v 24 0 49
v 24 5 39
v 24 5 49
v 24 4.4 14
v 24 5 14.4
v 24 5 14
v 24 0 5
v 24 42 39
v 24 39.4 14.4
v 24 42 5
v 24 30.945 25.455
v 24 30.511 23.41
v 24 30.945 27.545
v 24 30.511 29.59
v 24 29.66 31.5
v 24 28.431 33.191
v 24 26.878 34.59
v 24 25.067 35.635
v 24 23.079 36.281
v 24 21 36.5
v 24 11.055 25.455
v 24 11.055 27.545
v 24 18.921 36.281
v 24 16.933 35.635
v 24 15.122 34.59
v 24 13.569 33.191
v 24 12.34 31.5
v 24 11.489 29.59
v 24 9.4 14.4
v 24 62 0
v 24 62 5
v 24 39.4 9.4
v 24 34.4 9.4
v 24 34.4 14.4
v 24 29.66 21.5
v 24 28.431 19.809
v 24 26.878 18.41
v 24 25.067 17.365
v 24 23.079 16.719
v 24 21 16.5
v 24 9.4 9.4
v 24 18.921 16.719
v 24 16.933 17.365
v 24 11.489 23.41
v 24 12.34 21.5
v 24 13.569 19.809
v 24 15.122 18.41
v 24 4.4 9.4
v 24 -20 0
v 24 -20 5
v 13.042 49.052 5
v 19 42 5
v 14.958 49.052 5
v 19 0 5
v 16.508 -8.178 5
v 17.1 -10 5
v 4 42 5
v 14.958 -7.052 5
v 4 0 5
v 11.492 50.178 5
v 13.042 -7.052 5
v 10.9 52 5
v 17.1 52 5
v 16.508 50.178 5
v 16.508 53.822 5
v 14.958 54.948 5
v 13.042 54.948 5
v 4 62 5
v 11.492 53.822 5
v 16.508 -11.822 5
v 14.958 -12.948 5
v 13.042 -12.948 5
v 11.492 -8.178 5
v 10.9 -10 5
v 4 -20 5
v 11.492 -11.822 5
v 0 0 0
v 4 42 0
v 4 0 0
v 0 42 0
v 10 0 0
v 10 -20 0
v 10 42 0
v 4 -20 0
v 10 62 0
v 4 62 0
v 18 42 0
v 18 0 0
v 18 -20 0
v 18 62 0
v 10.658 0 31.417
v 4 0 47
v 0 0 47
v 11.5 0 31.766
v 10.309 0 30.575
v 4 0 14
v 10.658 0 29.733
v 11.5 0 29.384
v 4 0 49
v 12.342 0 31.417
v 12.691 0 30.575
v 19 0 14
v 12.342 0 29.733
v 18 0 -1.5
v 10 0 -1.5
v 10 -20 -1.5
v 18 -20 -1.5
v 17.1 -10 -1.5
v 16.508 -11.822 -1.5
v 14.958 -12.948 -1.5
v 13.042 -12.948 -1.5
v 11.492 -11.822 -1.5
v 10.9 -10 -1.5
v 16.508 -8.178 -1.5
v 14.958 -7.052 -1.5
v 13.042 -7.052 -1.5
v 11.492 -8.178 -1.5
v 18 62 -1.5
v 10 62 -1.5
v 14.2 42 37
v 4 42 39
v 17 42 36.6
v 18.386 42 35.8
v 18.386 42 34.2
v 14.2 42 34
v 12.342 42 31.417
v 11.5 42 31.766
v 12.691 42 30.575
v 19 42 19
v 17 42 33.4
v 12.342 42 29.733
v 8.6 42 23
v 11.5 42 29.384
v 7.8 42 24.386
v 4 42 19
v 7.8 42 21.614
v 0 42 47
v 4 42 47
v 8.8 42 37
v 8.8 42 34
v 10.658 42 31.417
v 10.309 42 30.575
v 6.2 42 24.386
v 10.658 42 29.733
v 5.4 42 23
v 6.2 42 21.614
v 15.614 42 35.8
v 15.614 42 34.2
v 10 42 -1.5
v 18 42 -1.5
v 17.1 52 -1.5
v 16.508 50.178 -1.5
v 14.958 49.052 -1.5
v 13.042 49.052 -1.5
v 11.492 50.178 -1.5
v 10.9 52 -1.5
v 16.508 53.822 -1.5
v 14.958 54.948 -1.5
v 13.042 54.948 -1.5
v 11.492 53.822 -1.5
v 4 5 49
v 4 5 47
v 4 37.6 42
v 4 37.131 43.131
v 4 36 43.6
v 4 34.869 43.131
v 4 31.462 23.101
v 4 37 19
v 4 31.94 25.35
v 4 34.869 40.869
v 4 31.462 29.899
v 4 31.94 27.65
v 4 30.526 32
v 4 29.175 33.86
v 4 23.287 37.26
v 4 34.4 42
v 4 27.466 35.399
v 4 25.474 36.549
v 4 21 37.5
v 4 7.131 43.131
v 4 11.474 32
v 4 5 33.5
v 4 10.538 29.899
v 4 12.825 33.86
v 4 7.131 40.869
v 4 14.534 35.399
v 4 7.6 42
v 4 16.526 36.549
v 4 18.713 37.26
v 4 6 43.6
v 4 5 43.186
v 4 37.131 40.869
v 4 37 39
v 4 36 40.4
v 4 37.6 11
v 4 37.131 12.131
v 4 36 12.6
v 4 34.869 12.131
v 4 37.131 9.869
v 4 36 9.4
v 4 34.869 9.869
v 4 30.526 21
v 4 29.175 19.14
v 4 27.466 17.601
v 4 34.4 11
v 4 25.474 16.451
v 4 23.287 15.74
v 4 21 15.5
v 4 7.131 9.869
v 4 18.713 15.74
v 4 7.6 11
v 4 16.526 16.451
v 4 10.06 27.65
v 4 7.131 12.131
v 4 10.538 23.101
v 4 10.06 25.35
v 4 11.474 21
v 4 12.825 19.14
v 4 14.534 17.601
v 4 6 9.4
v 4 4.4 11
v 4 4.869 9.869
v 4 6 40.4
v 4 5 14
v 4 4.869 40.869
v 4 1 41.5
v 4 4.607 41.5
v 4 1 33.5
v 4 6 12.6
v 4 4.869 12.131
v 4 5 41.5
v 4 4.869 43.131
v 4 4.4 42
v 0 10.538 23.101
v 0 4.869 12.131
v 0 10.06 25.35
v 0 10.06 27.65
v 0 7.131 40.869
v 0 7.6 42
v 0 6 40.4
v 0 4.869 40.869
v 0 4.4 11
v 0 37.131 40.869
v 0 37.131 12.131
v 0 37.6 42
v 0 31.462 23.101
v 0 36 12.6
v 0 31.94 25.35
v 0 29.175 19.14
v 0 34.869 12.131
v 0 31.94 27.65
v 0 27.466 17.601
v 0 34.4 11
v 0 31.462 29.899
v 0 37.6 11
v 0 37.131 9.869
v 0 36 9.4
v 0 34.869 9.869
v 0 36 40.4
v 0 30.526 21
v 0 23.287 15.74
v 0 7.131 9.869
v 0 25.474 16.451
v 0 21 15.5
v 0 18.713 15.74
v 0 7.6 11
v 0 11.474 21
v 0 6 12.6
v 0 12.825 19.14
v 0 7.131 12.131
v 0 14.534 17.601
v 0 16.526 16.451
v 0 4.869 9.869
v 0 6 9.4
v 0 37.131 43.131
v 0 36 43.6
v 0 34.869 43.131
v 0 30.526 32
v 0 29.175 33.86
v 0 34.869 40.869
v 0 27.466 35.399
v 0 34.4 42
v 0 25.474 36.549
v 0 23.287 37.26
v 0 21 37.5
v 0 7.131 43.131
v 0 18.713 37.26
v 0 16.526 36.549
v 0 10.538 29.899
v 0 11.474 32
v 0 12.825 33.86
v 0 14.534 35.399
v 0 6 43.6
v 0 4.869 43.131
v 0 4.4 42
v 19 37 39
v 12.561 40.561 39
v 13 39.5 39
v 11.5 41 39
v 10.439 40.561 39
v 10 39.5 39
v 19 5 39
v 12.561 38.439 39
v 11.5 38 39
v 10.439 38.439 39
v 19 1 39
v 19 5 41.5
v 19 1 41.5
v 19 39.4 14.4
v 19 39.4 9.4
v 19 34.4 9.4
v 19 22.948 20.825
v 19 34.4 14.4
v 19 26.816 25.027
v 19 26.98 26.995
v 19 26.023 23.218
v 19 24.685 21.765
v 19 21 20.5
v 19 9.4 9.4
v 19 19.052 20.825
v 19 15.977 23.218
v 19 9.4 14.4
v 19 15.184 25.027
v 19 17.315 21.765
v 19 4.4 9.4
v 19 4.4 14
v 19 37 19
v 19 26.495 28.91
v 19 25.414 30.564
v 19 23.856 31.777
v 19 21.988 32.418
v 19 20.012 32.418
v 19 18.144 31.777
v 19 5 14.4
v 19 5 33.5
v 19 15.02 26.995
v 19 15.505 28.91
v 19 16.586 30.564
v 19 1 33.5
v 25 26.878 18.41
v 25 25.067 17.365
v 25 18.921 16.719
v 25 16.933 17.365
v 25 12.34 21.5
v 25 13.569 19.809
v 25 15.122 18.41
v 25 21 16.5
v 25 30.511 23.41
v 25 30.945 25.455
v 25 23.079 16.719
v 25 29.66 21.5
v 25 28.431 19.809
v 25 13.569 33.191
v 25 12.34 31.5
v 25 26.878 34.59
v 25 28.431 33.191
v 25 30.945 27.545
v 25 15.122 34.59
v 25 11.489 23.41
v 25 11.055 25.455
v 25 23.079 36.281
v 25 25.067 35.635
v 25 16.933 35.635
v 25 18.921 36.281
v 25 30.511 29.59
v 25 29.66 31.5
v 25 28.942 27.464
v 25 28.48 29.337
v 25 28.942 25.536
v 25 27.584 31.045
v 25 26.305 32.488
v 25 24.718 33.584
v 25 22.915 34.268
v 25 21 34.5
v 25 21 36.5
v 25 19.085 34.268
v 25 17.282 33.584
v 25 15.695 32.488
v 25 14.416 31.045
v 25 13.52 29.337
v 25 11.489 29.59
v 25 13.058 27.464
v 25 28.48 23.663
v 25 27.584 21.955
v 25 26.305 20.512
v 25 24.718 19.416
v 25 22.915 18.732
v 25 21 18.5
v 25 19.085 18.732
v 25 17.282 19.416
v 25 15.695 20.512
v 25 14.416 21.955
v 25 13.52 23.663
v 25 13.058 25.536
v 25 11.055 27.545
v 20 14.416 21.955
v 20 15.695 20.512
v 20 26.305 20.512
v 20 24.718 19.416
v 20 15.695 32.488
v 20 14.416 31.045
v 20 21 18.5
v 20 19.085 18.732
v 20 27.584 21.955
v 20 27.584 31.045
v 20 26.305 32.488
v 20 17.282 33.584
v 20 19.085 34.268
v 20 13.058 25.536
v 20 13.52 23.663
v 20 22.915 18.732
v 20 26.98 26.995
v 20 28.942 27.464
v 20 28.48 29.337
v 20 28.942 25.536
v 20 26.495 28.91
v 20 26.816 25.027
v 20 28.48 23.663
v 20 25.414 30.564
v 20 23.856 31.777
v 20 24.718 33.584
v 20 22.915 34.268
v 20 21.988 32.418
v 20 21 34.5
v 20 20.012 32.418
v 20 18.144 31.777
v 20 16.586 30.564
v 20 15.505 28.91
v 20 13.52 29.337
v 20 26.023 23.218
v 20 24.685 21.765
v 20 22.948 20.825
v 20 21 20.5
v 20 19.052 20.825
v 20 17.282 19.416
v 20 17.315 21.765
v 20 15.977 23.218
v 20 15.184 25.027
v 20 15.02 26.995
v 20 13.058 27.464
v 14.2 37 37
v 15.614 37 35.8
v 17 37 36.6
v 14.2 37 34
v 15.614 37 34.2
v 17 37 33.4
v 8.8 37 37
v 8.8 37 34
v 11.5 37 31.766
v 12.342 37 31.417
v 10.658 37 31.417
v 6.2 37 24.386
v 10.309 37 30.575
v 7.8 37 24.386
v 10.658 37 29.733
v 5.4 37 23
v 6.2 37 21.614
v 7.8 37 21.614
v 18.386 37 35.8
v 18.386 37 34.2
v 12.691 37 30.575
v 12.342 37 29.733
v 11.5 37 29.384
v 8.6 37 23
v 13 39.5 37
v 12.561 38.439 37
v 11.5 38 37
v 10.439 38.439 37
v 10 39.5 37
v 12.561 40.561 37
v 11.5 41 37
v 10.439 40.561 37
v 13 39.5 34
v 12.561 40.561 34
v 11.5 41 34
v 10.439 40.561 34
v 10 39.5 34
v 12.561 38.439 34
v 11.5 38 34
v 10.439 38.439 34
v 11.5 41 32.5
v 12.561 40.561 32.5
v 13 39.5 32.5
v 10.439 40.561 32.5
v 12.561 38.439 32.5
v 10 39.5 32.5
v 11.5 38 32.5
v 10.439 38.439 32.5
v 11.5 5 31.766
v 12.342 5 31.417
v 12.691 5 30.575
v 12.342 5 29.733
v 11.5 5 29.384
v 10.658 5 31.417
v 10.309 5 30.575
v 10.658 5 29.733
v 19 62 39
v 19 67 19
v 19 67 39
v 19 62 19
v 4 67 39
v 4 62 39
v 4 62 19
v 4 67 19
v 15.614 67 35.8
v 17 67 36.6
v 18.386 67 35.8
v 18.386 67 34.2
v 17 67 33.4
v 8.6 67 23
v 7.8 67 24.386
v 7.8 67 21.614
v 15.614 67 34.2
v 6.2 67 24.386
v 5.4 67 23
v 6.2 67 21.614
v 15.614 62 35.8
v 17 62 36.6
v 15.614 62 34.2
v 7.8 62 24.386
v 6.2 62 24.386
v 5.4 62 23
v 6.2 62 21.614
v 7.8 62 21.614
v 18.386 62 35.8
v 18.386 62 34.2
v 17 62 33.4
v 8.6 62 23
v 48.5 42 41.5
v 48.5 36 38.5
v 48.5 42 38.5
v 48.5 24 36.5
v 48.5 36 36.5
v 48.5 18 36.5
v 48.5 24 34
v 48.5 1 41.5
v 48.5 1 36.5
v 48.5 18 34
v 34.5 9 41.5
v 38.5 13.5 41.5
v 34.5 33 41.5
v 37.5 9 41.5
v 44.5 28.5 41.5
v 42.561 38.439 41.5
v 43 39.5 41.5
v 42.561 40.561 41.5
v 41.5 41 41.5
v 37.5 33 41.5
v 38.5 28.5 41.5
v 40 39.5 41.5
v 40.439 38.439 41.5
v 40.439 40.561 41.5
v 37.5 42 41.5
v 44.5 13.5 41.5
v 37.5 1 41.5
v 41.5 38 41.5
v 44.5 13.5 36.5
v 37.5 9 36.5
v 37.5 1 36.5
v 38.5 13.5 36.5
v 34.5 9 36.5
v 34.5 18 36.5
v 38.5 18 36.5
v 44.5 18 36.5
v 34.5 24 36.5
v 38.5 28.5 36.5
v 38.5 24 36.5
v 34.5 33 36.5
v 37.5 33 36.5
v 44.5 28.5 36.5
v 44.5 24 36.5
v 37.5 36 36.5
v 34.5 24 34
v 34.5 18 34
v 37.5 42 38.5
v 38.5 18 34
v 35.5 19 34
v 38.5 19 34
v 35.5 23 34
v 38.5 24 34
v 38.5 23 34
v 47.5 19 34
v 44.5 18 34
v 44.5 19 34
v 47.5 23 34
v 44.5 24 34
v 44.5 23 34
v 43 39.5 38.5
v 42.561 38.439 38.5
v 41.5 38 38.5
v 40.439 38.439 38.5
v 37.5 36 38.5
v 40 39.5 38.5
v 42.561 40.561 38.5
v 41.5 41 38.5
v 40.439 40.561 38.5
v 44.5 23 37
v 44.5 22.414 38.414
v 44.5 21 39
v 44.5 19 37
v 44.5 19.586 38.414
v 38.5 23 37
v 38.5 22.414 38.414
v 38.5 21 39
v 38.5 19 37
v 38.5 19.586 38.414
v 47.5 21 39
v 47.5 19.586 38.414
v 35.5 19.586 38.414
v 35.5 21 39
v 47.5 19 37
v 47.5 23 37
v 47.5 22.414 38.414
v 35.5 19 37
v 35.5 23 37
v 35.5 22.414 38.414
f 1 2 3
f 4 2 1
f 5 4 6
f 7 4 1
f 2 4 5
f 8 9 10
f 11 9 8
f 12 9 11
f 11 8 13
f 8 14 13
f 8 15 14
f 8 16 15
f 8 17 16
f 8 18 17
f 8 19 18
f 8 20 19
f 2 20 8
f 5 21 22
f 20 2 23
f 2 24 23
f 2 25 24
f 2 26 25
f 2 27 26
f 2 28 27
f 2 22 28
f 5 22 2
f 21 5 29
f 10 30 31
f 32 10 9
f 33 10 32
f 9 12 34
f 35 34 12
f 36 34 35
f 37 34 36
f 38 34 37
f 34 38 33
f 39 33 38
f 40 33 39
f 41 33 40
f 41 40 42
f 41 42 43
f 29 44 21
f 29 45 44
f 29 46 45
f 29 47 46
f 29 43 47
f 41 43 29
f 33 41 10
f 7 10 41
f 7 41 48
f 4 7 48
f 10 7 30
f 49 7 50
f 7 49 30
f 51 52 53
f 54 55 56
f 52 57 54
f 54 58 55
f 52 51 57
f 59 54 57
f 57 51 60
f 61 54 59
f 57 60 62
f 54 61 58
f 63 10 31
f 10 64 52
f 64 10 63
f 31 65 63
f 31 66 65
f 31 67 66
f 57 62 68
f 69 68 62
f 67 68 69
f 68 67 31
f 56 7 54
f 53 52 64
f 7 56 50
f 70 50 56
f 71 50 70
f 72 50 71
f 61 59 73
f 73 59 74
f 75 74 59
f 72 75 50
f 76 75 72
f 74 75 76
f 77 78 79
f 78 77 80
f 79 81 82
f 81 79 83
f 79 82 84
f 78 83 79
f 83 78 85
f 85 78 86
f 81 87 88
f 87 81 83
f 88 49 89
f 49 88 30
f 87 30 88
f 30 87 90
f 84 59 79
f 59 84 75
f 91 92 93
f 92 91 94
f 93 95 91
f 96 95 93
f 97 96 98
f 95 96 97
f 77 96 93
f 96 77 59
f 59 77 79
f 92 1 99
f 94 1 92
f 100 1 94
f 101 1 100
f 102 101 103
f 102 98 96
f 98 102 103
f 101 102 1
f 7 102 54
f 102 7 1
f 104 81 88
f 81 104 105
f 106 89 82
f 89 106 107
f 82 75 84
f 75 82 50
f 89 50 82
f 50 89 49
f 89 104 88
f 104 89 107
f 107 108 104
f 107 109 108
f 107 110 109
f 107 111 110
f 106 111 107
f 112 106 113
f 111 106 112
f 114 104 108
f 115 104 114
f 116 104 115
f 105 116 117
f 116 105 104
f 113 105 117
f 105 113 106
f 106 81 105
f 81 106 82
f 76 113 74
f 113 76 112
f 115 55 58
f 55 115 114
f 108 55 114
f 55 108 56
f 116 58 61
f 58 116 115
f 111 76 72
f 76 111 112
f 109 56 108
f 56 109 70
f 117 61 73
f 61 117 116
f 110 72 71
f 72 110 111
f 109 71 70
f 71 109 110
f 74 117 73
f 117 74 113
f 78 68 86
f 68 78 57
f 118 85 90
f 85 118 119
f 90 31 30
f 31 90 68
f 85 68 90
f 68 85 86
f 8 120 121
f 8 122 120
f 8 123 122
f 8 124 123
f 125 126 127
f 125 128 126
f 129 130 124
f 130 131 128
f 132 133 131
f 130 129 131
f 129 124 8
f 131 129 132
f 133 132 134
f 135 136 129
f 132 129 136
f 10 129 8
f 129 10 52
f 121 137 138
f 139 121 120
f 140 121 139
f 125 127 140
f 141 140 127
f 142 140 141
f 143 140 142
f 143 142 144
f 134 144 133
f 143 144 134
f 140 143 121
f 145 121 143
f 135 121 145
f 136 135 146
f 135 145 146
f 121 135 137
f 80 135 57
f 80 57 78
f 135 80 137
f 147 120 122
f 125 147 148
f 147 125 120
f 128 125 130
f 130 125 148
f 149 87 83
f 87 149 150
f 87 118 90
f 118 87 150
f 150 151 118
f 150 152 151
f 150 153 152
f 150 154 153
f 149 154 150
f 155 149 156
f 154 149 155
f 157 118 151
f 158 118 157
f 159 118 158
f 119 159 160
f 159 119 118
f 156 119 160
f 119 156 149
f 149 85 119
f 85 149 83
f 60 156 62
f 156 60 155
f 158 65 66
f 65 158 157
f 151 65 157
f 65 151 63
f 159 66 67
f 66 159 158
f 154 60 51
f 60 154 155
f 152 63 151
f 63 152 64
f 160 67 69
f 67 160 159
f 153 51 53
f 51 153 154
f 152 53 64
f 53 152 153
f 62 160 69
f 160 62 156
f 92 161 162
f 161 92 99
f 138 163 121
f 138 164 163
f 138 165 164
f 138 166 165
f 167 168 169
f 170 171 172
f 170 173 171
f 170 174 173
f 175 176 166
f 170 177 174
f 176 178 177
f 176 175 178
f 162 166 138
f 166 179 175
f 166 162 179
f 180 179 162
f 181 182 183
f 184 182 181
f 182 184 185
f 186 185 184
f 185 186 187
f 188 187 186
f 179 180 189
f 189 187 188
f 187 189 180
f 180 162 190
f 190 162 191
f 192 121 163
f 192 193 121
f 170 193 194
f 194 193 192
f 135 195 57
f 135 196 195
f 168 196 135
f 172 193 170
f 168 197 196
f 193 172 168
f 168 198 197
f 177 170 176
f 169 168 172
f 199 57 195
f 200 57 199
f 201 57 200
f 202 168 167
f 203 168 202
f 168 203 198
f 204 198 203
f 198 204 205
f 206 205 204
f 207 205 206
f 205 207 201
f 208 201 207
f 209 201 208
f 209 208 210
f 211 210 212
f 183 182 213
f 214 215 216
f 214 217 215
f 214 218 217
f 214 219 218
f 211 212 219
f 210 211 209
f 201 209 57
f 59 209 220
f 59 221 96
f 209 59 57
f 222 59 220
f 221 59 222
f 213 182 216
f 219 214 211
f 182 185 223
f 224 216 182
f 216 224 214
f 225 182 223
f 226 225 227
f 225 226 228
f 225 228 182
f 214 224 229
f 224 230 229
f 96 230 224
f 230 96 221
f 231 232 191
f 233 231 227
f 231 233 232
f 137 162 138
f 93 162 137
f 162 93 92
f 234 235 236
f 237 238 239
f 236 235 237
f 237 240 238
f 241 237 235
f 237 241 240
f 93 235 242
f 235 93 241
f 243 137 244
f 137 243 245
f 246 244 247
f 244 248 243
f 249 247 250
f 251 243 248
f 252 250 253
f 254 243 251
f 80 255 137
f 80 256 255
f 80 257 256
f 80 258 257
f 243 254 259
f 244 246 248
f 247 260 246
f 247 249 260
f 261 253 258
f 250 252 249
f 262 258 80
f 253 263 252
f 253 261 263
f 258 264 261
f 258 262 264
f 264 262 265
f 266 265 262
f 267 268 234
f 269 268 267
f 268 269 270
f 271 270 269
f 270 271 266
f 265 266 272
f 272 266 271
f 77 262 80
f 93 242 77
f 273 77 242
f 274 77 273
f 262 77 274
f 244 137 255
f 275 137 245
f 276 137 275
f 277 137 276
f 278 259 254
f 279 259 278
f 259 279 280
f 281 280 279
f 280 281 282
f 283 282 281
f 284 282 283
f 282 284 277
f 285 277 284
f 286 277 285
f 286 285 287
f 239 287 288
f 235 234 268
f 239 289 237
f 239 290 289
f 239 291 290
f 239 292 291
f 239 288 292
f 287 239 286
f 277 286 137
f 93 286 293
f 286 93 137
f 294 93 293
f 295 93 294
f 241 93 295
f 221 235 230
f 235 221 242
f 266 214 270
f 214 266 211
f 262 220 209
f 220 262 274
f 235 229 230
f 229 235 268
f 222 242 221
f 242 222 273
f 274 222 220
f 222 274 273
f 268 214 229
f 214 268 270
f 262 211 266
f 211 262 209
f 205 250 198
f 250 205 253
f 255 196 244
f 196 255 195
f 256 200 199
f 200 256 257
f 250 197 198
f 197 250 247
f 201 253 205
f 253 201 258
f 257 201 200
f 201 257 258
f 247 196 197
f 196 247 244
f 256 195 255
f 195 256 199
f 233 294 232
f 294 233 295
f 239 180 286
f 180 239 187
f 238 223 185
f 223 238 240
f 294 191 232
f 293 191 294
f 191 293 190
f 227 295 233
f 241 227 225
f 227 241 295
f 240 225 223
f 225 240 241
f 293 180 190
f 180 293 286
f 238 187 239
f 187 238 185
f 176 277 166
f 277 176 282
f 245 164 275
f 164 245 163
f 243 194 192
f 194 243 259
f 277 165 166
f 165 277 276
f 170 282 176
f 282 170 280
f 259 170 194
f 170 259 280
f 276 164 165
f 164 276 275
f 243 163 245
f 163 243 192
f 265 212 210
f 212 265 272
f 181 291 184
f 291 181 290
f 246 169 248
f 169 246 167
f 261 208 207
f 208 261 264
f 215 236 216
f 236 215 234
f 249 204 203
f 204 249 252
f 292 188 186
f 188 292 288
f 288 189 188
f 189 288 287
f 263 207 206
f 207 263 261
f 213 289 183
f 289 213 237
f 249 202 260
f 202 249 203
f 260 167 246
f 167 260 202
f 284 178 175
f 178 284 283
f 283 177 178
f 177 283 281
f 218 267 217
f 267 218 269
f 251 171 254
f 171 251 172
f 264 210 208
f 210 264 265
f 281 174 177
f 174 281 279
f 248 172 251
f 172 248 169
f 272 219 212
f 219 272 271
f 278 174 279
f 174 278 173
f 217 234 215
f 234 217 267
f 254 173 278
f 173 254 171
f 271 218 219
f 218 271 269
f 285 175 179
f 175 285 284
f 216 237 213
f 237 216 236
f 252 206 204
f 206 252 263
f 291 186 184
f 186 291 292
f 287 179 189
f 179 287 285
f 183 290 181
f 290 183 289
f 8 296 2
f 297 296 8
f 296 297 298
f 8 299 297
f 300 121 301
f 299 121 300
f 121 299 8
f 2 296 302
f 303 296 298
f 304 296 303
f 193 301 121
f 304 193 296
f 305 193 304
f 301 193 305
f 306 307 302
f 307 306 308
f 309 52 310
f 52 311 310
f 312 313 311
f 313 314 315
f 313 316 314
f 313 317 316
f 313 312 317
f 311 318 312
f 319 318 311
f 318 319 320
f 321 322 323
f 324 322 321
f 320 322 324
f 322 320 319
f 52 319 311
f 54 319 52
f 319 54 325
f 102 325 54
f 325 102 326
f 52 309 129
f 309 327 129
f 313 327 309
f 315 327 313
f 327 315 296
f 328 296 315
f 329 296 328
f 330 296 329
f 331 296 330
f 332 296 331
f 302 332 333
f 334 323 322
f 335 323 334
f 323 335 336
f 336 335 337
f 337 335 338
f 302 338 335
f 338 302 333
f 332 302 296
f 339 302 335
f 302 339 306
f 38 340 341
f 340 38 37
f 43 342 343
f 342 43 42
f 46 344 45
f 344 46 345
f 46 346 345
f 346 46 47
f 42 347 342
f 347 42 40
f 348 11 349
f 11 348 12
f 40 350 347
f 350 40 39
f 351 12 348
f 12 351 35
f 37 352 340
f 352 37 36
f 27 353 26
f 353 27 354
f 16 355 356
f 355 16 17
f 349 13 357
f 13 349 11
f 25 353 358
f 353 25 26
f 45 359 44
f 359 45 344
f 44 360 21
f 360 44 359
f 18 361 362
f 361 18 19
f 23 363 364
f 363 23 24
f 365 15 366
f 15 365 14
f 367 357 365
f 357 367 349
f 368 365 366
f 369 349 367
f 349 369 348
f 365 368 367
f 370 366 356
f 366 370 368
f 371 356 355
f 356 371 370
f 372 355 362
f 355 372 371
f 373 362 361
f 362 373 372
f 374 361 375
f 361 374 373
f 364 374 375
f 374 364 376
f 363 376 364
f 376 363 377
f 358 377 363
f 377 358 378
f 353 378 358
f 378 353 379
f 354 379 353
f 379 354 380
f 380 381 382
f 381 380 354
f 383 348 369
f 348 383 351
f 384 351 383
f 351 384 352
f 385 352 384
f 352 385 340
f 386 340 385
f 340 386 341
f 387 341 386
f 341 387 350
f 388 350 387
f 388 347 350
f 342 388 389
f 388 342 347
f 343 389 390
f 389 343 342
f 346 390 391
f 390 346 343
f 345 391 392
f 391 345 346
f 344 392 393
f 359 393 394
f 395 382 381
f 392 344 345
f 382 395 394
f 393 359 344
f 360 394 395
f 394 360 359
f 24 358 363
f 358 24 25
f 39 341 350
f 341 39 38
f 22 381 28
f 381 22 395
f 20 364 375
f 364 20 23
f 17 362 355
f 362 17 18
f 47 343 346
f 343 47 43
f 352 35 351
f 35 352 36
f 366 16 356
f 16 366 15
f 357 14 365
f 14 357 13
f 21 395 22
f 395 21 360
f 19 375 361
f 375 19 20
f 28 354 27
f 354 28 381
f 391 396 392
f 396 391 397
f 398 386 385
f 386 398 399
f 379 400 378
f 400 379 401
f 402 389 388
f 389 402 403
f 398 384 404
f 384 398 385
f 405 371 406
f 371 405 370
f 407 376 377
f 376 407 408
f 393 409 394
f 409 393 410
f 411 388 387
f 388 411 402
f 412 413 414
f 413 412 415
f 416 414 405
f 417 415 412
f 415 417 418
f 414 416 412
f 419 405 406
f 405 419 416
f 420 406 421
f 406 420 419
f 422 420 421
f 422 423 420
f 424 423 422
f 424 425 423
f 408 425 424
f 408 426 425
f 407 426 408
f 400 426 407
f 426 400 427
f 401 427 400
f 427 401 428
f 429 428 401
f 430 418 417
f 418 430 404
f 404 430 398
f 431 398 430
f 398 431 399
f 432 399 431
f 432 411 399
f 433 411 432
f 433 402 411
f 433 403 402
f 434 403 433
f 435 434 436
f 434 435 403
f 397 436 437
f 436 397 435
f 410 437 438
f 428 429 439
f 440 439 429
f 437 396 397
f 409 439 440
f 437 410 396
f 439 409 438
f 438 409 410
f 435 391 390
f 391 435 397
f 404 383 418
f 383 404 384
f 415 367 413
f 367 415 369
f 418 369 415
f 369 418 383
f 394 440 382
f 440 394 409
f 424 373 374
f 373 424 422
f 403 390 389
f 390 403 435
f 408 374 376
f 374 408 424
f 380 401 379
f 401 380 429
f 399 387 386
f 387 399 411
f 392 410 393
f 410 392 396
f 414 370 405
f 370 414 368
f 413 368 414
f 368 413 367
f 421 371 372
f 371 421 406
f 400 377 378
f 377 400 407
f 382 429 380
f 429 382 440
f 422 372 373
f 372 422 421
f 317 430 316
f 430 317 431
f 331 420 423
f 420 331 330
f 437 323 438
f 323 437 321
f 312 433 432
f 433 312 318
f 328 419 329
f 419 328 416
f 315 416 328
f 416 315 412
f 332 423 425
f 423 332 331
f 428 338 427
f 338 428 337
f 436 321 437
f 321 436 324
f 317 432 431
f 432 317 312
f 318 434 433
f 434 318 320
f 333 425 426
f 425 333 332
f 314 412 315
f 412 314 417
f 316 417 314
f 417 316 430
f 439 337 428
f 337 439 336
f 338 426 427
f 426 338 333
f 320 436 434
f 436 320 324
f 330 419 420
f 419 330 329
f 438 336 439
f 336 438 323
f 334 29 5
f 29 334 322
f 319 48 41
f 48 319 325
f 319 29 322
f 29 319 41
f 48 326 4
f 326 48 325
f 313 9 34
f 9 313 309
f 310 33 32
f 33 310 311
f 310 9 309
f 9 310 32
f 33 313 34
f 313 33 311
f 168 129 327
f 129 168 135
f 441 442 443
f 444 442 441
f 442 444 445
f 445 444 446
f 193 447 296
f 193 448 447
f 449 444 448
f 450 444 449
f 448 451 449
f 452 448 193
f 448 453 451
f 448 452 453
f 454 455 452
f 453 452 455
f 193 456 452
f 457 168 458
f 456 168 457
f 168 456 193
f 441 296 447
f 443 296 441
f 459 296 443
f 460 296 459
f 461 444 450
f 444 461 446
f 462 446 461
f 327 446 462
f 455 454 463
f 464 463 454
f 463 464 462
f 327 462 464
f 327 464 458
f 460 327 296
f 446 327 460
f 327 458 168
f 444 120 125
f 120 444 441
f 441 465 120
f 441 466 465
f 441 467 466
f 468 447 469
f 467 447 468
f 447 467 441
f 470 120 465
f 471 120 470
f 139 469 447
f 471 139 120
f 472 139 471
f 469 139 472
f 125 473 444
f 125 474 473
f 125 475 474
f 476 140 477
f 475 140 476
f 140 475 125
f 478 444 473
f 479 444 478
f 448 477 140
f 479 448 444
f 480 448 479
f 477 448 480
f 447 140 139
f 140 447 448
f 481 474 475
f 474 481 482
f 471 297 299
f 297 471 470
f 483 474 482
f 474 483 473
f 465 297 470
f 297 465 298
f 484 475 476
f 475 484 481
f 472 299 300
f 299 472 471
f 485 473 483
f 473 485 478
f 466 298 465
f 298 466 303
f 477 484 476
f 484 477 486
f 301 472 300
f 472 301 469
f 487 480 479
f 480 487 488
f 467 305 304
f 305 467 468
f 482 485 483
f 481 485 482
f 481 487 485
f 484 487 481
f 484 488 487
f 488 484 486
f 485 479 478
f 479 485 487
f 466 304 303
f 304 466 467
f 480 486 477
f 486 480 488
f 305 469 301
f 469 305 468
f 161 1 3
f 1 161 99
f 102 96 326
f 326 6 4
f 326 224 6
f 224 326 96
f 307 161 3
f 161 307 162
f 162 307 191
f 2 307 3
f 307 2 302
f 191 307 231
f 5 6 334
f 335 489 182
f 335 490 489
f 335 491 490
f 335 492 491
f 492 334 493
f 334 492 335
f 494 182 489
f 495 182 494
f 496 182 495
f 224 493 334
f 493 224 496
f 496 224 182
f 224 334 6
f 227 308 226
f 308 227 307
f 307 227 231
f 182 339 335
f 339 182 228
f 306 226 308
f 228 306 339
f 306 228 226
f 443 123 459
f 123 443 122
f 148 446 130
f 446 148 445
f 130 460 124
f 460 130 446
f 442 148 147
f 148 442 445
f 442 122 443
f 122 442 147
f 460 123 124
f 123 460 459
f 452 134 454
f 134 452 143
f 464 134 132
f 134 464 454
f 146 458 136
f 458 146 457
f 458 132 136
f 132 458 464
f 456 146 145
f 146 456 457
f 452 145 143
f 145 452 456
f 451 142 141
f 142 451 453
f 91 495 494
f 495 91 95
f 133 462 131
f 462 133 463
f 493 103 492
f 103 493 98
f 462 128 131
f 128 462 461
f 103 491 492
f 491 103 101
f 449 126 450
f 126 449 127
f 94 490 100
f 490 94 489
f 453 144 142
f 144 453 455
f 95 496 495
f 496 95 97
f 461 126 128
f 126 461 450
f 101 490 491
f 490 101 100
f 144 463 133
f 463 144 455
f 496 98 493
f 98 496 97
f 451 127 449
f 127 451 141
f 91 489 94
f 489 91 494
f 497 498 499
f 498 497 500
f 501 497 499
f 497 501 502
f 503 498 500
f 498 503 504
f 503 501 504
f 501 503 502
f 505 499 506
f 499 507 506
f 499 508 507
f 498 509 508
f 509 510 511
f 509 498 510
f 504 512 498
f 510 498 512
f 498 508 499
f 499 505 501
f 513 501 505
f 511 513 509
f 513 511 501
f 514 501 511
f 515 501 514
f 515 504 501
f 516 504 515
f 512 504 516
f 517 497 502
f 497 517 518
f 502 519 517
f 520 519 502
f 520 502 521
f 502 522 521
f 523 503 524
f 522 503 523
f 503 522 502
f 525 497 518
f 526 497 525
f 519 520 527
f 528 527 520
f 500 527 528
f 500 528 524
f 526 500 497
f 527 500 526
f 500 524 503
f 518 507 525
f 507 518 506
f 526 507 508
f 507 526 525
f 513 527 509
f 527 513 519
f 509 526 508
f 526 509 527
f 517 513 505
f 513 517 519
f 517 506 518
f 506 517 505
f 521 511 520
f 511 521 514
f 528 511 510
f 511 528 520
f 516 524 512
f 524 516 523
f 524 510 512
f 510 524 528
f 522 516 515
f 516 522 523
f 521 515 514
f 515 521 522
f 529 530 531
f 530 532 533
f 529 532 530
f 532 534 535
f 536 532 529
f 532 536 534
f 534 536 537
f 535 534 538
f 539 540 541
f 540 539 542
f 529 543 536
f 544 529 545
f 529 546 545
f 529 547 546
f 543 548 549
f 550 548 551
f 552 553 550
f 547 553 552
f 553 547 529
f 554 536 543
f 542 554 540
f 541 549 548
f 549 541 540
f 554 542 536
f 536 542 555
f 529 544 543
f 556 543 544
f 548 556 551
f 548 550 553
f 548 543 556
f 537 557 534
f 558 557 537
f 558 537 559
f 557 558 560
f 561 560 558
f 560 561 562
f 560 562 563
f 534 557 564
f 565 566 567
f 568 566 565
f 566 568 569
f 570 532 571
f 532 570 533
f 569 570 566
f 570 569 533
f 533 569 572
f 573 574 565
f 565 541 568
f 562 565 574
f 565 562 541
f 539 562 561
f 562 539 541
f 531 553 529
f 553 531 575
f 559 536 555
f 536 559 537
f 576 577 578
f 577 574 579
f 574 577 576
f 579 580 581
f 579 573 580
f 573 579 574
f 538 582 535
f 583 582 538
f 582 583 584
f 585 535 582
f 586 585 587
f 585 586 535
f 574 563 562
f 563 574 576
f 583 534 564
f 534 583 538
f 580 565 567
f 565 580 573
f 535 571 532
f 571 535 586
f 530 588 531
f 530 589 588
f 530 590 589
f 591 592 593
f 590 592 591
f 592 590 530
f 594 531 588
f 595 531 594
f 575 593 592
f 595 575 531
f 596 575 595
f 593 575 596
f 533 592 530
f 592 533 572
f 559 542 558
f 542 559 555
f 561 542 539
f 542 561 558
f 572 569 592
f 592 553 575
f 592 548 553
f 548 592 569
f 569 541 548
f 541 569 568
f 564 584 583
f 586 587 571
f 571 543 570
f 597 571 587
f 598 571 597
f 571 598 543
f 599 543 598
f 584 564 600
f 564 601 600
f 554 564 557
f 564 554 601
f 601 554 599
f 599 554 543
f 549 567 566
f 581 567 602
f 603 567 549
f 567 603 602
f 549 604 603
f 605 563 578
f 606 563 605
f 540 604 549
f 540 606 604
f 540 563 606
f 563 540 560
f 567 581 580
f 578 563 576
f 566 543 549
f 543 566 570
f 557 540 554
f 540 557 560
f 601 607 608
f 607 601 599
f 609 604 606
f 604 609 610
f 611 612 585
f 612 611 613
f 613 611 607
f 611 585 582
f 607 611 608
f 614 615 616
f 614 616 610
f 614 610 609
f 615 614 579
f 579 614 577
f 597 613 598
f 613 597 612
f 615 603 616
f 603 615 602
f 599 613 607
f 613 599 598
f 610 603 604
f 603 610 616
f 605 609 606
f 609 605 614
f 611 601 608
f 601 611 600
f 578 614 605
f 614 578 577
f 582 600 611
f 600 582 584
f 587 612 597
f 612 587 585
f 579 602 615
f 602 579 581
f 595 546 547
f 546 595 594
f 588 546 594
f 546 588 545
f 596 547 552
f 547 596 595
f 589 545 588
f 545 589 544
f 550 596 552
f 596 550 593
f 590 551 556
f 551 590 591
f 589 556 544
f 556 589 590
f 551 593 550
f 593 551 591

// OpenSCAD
/*import("/home/knezi/Documents/3d-tiskarna/knezi/RebeliX/src/Extrud
er_filament_1.75mm/Compact_Bowden_Extruder.stl", convexity=3);

translate([20, 0, 0]){
import("/home/knezi/Documents/3d-tiskarna/knezi/RebeliX/src/Extruder_filament_1.75mm/Idler_Part_1.stl", convexity=3);

import("/home/knezi/Documents/3d-tiskarna/knezi/RebeliX/src/Extruder_filament_1.75mm/Idler_Part_2.stl", convexity=3);
}*/

filament_diameter=2;
filament_feed_hole_d=(filament_diameter*1.1)/cos(180/8);
m3_nut_diameter = 6.1;

difference() {
	union() {
		cube([4,42,47]);
		//translate([-40,0]) cube([40,47,5]);
//		translate([-20,0,5]) cube([20,5,5]);
		//translate([-40,42,5]) cube([40,5,45]);

	difference() {
			union() {
				translate([4,-20,0]) cube([20,20,5]);
				translate([10,-20,-1.5]) cube([8,20,1.5]);
			}
			translate([14,-10,-2]) cylinder(r=3.1,h=10);
		}

		translate([0,62,0]) difference() {
			union() {
				translate([4,-20,0]) cube([20,20,5]);
				translate([10,-20,-1.5]) cube([8,20,1.5]);
			}
			translate([14,-10,-2]) cylinder(r=3.1,h=10);
		}
	}
	
	translate([-1,6,5+6])
		rotate([0,90,0]) cylinder(r=1.6,h=10,$fn=8);
	translate([-1,42-(6),5+6])
		rotate([0,90,0]) cylinder(r=1.6,h=10,$fn=8);
	translate([-1,6,5+6+31])
		rotate([0,90,0]) cylinder(r=1.6,h=10,$fn=8);
	translate([-1,42-(6),5+6+31])
		rotate([0,90,0]) cylinder(r=1.6,h=10,$fn=8);

	translate([-1,21,26.5]) {// velka dira pro motor
		rotate([0,90,0]) 	cylinder(r=11,h=10);

		}
}
	



translate([19,21,26.5]) { // uložení ložiska hřídele
	difference() {
		union() {
			translate([0,-21,-26.5]) cube([5,42,39]);
			rotate([0,90,0]) cylinder(r=10,h=6);
		}
		translate([1,0]) rotate([0,90,0]) cylinder(r=8,h=10);
		translate([-1,0]) rotate([0,90,0]) cylinder(r=6,h=11);
		translate([-1,4.4-21,9.4-26.5]) cube([7,5,5]);
		translate([-1,42-7.6-21,9.4-26.5]) cube([7,5,5]);
	}
}



// pruchod filamentu

	translate([4,0,0]) cube([15,42,5]);
difference() {
	union() {
		difference() {
			translate([4,37,9+5+5]) cube([15,5,20]);
//			translate([4+7.5,39.5,35]) rotate([0,0,30]) cylinder(r=m3_nut_diameter/2,h=50,$fn=6);
			translate([4+7.5-2.7,36,34]) cube([5.4, 7, 3]);
			translate([4+7.5,39.5,32.5]) cylinder(r=1.5,h=20,$fn=8);
		}
		difference() {
			translate([4,0,9+5]) cube([20,5,35]);
			translate([4,1,33.5]) cube([15,6,8]);
		}
	};
	
	//upevnění bowdenu
	translate([19-2,36,35]) rotate([-90,30,0]) cylinder(r=1.6,h=50,$fn=6);
	translate([4+3,36,23]) rotate([-90,0,0]) cylinder(r=1.6,h=50,$fn=6);

	translate([11.5,-5, 26.5+4.075]) rotate([-90,0,0]) cylinder(r=filament_feed_hole_d/2,h=50,$fn=8);	
}



//drzak bowden	
translate([0,25,0]) difference() {
	translate([4,37,9+5+5]) cube([15,5,20]);
	//upevnění bowdenu
	translate([19-2,36,35]) rotate([-90,30,0]) cylinder(r=1.6,h=50,$fn=6);
	translate([4+3,36,23]) rotate([-90,0,0]) cylinder(r=1.6,h=50,$fn=6);
}




translate([30,0,0])
// IDLER
difference() {
	union() {
		translate([4.5,1,36.5]) cube([14,41,5]);
		translate([4.5,24,37]) rotate([-180,0]) cube([14,6,3]);
	}
	translate([4,36,36]) cube([15.5,47,2.5]);
	translate([4,0,36]) cube([3.5,9,7]);
	translate([4,46-13,36]) cube([3.5,13,7]);
//	translate([11.5,21,37]) rotate([0,90]) cylinder(r=6.5, h=6, center=true); // test lozisko
	translate([11.5-3,21-7.5,33]) cube([6,15,20]); 
	translate([11.5,21,37]) rotate([0,90,0]) cylinder(r=2, h=12, center=true, $fn=8);
	translate([11.5-6,23,37]) rotate([-180,0]) cube([12,4,10]);
translate([4+7.5,39.5,32.5]) cylinder(r=1.5,h=20,$fn=8);
}




//translate([-10,21,26.5]) rotate([0,90,0]) cylinder(r=4.075, h=40); // test hridel
//translate([11.5,21,37]) rotate([0,90]) cylinder(r=6.5, h=6, center=true); // test lozisko
